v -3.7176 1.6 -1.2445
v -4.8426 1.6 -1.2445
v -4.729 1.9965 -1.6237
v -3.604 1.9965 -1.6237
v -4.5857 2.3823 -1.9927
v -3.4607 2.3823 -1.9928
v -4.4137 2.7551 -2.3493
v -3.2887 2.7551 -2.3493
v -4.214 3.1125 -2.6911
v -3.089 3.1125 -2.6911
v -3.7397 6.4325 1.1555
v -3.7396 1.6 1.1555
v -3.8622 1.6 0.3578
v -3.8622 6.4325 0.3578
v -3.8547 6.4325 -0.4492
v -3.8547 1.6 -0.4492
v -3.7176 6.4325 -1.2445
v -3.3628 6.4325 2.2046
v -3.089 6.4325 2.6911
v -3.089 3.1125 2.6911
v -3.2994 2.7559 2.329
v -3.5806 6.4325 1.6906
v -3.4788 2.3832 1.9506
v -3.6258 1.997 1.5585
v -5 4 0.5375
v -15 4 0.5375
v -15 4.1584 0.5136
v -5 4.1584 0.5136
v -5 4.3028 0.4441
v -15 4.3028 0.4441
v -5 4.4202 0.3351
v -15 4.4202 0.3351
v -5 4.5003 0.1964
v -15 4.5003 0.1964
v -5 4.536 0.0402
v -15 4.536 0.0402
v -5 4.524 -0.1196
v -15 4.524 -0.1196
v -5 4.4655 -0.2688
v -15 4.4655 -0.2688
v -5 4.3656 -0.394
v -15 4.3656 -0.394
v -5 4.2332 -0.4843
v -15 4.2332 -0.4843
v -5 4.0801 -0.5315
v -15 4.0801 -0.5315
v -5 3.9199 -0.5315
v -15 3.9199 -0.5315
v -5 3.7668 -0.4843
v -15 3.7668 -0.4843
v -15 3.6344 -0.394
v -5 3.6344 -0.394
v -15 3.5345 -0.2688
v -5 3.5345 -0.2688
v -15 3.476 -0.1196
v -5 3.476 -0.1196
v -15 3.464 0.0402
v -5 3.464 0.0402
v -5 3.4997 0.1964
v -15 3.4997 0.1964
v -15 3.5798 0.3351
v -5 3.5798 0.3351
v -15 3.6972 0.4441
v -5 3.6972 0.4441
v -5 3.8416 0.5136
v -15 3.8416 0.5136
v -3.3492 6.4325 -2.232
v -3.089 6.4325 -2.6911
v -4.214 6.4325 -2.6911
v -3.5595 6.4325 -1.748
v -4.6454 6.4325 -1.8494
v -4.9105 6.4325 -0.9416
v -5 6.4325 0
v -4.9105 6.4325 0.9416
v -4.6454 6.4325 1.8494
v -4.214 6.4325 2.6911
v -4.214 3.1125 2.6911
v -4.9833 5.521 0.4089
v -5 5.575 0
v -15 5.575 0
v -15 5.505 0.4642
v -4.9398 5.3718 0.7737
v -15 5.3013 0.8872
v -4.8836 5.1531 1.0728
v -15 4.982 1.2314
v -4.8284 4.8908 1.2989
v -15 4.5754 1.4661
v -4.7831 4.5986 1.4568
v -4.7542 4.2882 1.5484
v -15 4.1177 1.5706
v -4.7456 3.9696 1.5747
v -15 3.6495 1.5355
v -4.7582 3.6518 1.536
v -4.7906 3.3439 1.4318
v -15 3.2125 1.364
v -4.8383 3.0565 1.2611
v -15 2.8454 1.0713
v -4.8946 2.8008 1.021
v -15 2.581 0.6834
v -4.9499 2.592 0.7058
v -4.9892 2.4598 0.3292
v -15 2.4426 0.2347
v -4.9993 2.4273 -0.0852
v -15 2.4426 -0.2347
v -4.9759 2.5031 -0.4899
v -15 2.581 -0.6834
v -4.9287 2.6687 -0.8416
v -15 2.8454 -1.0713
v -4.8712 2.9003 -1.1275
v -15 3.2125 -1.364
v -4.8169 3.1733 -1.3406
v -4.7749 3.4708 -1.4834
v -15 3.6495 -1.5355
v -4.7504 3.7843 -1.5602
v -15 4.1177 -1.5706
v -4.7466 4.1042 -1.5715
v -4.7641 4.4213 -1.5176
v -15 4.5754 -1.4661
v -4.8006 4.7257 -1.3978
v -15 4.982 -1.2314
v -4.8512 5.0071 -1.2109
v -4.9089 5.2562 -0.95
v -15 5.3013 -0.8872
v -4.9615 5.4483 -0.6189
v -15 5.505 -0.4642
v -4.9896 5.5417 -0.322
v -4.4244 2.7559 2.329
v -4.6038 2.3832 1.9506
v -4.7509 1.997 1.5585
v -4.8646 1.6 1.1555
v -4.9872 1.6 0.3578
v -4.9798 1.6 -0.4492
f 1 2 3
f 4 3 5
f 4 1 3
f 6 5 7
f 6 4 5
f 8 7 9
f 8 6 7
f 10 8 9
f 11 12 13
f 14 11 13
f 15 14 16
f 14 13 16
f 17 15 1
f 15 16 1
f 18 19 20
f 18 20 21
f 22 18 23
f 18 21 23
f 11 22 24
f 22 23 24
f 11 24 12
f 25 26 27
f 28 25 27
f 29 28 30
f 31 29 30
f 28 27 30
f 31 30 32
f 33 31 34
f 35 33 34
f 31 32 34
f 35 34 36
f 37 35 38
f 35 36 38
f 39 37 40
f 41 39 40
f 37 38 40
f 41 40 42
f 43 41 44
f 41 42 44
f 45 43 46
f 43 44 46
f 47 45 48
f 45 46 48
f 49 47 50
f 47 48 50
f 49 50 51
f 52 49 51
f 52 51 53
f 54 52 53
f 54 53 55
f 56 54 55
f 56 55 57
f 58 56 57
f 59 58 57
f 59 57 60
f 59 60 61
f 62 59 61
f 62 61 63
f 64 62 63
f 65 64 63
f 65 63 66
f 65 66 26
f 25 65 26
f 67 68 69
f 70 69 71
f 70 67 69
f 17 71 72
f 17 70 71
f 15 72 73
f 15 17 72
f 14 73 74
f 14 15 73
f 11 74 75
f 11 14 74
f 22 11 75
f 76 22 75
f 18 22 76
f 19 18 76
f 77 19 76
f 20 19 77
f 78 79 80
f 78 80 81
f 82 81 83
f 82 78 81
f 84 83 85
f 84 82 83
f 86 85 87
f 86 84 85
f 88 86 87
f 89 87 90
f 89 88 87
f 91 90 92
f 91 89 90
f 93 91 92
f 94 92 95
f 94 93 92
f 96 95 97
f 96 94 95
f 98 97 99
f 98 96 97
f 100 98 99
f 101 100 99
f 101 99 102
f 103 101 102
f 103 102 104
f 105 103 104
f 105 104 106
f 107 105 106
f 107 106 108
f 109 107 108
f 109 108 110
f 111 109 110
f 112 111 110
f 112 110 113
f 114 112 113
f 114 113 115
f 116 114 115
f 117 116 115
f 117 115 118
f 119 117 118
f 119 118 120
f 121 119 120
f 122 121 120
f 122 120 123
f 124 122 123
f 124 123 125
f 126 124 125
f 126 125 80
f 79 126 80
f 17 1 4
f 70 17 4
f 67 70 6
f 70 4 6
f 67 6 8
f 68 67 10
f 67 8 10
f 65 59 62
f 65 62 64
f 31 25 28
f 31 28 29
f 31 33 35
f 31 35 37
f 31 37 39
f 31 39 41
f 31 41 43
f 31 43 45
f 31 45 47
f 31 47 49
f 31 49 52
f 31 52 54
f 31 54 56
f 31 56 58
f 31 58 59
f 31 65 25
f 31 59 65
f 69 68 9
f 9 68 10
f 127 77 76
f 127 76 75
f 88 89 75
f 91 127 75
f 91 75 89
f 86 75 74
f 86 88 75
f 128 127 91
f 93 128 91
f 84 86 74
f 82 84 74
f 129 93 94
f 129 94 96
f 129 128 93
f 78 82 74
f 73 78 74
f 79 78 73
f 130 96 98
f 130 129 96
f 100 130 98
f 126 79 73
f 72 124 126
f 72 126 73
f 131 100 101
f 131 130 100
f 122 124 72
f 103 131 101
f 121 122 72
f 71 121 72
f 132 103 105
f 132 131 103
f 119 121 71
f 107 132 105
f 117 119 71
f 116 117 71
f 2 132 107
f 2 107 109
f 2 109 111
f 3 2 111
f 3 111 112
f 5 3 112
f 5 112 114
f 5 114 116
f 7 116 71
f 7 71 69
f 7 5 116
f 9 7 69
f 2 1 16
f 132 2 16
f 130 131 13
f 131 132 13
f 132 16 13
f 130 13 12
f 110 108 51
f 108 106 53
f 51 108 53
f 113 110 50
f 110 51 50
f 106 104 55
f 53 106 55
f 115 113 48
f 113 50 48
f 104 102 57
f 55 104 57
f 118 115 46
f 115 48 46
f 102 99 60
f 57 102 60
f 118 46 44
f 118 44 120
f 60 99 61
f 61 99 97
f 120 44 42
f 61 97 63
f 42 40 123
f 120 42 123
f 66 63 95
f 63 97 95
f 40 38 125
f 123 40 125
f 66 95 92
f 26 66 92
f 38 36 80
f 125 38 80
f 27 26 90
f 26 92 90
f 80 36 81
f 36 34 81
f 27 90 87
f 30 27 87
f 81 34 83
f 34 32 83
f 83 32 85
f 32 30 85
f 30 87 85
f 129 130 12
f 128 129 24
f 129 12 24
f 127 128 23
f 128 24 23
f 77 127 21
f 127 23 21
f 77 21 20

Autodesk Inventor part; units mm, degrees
ref_plane "YZ Plane" through (0, 0, 0) normal (1, 0, 0) x (0, 1, 0)
ref_plane "XZ Plane" through (0, 0, 0) normal (0, 1, 0) x (-1, 0, 0)
ref_plane "XY Plane" through (0, 0, 0) normal (0, 0, 1) x (1, 0, 0)
sketch "Sketch1" plane through (0, 0, 0) normal (0, 1, 0) x (-1, 0, 0)
  arc A0 (0, -5) -> (0, 5) centre (0, 0) ccw
  line L0 (0, 5) -> (0, -5)
  dimension "d0" = 10
extrude "Extrusion1" add sketch "Sketch1" along normal blind 10
sketch "Sketch2" plane through (0, 0, 0) normal (1, 0, 0) x (0, 1, 0)
  line L0 (8.0172, -4.5) -> (8.0172, 4.5)
  line L1 (8.0172, 4.5) -> (2.5172, 4.5)
  line L2 (2.5172, -4.5) -> (0.0172, -2)
  line L3 (2.5172, 4.5) -> (0.0172, 2)
  line L4 (0.0172, -2) -> (0.0172, 2)
  line L5 (8.0172, -4.5) -> (2.5172, -4.5)
  point P0 (0, 0)
  dimension "d3" = 9
  dimension "d4" = 8
sketch "Sketch3" plane through (0, 0, 0) normal (1, 0, 0) x (0, 1, 0)
  line L0 (0, 2) -> (3, 5)
  arc A0 (3, 5) -> (0, 2) centre (1, 4) ccw
  line L1 (0, -2) -> (4, -6)
  arc A1 (0, -2) -> (4, -6) centre (1.75, -4.25) ccw
  line L2 (8.0325, 5) -> (11, 5)
  line L3 (11, 5) -> (11, -6)
  line L4 (11, -6) -> (8.0325, -6)
  line L5 (8.0325, -6) -> (8.0325, 5)
  line L6 (2.4911, 4.4911) -> (5, 7)
  line L7 (2.4911, 4.4911) -> (8.0325, 4.4911)
  arc A2 (8.0325, 4.4911) -> (5, 7) centre (7, 6.3303) ccw
  line L8 (2.4911, -4.4911) -> (8.5706, -4.4911)
  arc A3 (2.4911, -4.4911) -> (8.5706, -4.4911) centre (5.5309, -7.5041) ccw
  point P0 (0, 0)
extrude "Extrusion2" cut sketch "Sketch3" against normal through all
sketch "Sketch4" plane through (0, 0, 0) normal (0, 1, 0) x (-1, 0, 0)
  arc A0 (1.0726, -4.4911) -> (1.0726, 4.4911) centre (-1.125, 0) ccw
  arc A1 (1.0726, 4.4911) -> (1.0726, -4.4911) centre (-0.4517, 0) ccw
  point P0 (0, 0)
  point P1 (2.1976, -4.4911)
  point P2 (2.1976, 4.4911)
  dimension "d9" = 1.125
  dimension "d10" = 1.125
extrude "Extrusion3" cut sketch "Sketch4" along normal through all both and the other way through all
sketch "Sketch5" plane through (0, 0, 0) normal (1, 0, 0) x (0, 1, 0)
  line L0 (1.6, -1.2445) -> (1.6, 1.1555)
  line L1 (6.4325, 2.6911) -> (3.1125, 2.6911)
  line L2 (6.4325, -2.6911) -> (6.4325, 2.6911)
  line L3 (6.4325, -2.6911) -> (3.1125, -2.6911)
  line L4 (0, 2) -> (0, -2) projected
  line L5 (8.0325, 4.4911) -> (8.0325, -4.4911) projected
  line L6 (0, 2) -> (2.4911, 4.4911) projected
  line L7 (2.4911, 4.4911) -> (8.0325, 4.4911) projected
  line L8 (8.0325, 4.4911) -> (8.0325, -4.4911) projected
  line L9 (8.0325, -4.4911) -> (2.4911, -4.4911) projected
  line L10 (2.4911, -4.4911) -> (0, -2) projected
  line L11 (0, 2) -> (0, -2) projected
  line L12 (1.6, 1.1555) -> (3.1125, 2.6911)
  line L13 (1.6, -1.2445) -> (3.1125, -2.6911)
  line L14 (1.6, 4.6579) -> (1.6, -5.3823)
  arc A0 (1.6, 4.6579) -> (1.6, -5.3823) centre (3.2437, -0.3622) ccw
  line L15 (1.6, 1.1555) -> (5.4757, 5.0906)
  line L16 (1.6, 1.1555) -> (1.6, 7.5999)
  arc A1 (5.4757, 5.0906) -> (1.6, 7.5999) centre (3.8837, 6.8794) ccw
  line L17 (3.1125, 2.6911) -> (12.4034, 2.6911)
  line L18 (3.1125, 2.6911) -> (8.5318, 8.1936)
  arc A2 (12.4034, 2.6911) -> (8.5318, 8.1936) centre (8.3272, 3.9364) ccw
  line L19 (6.4325, 2.6911) -> (13.6333, 2.6911)
  line L20 (6.4325, 2.6911) -> (6.4325, -9.3636)
  arc A3 (6.4325, -9.3636) -> (13.6333, 2.6911) centre (6.37, -1.1482) ccw
  line L21 (6.4325, -2.6911) -> (6.4325, -11.5775)
  line L22 (6.4325, -2.6911) -> (3.1125, -2.6911)
  line L23 (3.1125, -2.6911) -> (3.2437, -12.8567)
  arc A4 (3.2437, -12.8567) -> (6.4325, -9.3636) centre (5.6123, -11.8169) ccw
  line L24 (1.6, -1.2445) -> (1.6, -8.2222)
  line L25 (1.6, -1.2445) -> (3.1125, -2.6911)
  line L26 (3.1125, -2.6911) -> (3.1946, -9.0574)
  arc A5 (1.6, -8.2222) -> (3.1946, -9.0574) centre (2.6381, -8.1801) ccw
  point P0 (0, 0)
  dimension "d16" = 1.6
  dimension "d18" = 1.6
  dimension "d21" = 1.8
  dimension "d23" = 1.8
  dimension "d24" = 2.4
  dimension "d26" = 3.32
  dimension "d27" = 3.32
extrude "Extrusion4" cut sketch "Sketch5" against normal through all contours L14 L10 L4 L6 L0 | L13 L23 L9 L10 L14 | L14 L6 L7 L15 L12 | L3 L20 L9 L23 | L14 A0 L6 L4 L10 | L10 L9 L23 A5 L24 L14 | L15 L7 L5 L17 L1 | L14 L16 A1 L15 L7 L6 | L2 L17 L5 L9 L20 | L9 L20 A4 L23 | L15 L18 A2 L17 L5 L7 | L9 L5 L17 L19 A3 L20
sketch "Sketch6" plane through (0, 0, 0) normal (1, 0, 0) x (0, 1, 0)
  circle A0 centre (4, 0) radius 1.575
  line L0 (1.6, -1.2445) -> (1.6, 1.1555) projected
  point P0 (0, 0)
  dimension "d31" = 3.15
  dimension "d32" = 2.4
extrude "Extrusion5" add sketch "Sketch6" against normal blind 15
sketch "Sketch7" plane through (0, 0, 0) normal (0, 1, 0) x (-1, 0, 0)
  arc A0 (3.089, -2.6911) -> (3.7176, -1.2445) centre (-1.125, 0) ccw projected
  arc A1 (3.7397, 1.1555) -> (3.089, 2.6911) centre (-1.125, 0) ccw projected
  arc A2 (3.7176, -1.2445) -> (3.7397, 1.1555) centre (-1.125, 0) ccw
  arc A3 (3.089, 2.6911) -> (3.089, -2.6911) centre (1.8078, 0) ccw
  point P0 (0, 0)
extrude "Extrusion6" cut sketch "Sketch7" along normal through all
sketch "Sketch8" plane through (-15, 4, 0) normal (-1, 0, 0) x (0, 0, 1)
  circle A0 centre (0, 0) radius 0.5375
  point P0 (0, -4)
  dimension "d37" = 1.075
extrude "Extrusion7" cut sketch "Sketch8" against normal blind 10
properties part number "10mm_radius_labmaker_cSkull_mold_window_stabilizer_Apr0119"
